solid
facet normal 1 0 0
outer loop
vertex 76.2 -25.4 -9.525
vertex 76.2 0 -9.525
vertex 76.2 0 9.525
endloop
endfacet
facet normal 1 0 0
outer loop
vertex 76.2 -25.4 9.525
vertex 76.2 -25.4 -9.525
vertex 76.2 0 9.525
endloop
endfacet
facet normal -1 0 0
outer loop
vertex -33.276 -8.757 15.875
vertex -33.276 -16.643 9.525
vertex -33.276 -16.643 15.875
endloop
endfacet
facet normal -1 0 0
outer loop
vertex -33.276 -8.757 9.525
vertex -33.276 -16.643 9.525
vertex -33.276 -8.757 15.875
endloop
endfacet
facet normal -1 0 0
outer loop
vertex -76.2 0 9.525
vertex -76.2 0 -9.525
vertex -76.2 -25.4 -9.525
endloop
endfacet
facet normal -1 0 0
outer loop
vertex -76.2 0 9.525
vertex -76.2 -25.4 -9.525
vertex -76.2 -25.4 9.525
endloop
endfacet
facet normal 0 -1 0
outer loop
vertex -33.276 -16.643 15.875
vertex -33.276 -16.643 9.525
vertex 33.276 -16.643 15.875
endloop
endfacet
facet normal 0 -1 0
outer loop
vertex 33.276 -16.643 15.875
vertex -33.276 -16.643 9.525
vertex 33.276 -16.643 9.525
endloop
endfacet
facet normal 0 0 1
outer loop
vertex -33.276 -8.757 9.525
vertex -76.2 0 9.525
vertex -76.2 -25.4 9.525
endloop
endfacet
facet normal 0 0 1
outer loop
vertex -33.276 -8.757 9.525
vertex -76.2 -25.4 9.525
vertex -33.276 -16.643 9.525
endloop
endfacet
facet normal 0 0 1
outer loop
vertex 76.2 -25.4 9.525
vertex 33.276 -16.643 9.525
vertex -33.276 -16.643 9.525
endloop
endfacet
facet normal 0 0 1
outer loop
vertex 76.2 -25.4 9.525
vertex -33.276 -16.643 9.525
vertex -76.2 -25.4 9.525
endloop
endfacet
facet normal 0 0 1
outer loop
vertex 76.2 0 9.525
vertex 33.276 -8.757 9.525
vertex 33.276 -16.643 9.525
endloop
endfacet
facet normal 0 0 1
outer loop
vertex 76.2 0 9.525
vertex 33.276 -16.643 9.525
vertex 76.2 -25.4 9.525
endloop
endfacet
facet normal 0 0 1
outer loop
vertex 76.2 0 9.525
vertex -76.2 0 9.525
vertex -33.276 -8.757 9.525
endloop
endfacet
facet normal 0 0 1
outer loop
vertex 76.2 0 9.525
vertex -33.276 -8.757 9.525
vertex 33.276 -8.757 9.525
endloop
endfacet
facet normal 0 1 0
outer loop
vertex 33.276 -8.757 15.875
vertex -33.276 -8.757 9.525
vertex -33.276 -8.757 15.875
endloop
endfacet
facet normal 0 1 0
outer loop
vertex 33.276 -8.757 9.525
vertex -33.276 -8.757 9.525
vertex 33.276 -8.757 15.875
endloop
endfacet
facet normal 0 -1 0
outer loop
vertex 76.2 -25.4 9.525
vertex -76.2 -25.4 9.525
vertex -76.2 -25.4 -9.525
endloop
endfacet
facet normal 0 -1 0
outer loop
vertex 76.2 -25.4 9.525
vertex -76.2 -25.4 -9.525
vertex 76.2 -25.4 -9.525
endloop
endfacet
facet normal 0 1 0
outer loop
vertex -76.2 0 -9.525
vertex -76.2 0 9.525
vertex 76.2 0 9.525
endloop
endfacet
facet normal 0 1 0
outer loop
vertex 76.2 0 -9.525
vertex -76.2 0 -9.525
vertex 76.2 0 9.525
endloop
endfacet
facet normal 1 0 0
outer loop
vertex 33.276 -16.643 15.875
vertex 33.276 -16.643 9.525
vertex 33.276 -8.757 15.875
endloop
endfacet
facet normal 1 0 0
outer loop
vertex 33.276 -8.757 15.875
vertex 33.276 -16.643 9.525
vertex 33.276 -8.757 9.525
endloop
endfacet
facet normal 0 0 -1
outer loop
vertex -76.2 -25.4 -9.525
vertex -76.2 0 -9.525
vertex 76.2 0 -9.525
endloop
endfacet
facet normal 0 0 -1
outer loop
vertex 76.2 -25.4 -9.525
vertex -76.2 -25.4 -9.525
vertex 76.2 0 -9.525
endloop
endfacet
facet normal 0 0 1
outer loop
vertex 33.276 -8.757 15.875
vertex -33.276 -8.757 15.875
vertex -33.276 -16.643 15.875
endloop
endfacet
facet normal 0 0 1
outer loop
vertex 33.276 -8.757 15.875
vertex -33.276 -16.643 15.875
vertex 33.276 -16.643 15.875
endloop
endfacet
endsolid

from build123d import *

# Parameters (mm, degrees)
F0_W     = 152.4
F0_H     = 19.05
F1_DEPTH = 25.4
F2_W     = 66.552096
F2_H     = 7.88629
F3_DEPTH = 6.35


with BuildPart() as f1:
    # F0 (on Front) → F1 (new body)
    with BuildSketch(Plane.XZ):
        Rectangle(F0_W, F0_H)
    extrude(amount=F1_DEPTH)

    # F2 (on face) → F3 (join)
    with BuildSketch(Plane.XY.offset(9.525)):
        with Locations((0, -12.7)):
            Rectangle(F2_W, F2_H)
    extrude(amount=F3_DEPTH)


solid = f1.part
